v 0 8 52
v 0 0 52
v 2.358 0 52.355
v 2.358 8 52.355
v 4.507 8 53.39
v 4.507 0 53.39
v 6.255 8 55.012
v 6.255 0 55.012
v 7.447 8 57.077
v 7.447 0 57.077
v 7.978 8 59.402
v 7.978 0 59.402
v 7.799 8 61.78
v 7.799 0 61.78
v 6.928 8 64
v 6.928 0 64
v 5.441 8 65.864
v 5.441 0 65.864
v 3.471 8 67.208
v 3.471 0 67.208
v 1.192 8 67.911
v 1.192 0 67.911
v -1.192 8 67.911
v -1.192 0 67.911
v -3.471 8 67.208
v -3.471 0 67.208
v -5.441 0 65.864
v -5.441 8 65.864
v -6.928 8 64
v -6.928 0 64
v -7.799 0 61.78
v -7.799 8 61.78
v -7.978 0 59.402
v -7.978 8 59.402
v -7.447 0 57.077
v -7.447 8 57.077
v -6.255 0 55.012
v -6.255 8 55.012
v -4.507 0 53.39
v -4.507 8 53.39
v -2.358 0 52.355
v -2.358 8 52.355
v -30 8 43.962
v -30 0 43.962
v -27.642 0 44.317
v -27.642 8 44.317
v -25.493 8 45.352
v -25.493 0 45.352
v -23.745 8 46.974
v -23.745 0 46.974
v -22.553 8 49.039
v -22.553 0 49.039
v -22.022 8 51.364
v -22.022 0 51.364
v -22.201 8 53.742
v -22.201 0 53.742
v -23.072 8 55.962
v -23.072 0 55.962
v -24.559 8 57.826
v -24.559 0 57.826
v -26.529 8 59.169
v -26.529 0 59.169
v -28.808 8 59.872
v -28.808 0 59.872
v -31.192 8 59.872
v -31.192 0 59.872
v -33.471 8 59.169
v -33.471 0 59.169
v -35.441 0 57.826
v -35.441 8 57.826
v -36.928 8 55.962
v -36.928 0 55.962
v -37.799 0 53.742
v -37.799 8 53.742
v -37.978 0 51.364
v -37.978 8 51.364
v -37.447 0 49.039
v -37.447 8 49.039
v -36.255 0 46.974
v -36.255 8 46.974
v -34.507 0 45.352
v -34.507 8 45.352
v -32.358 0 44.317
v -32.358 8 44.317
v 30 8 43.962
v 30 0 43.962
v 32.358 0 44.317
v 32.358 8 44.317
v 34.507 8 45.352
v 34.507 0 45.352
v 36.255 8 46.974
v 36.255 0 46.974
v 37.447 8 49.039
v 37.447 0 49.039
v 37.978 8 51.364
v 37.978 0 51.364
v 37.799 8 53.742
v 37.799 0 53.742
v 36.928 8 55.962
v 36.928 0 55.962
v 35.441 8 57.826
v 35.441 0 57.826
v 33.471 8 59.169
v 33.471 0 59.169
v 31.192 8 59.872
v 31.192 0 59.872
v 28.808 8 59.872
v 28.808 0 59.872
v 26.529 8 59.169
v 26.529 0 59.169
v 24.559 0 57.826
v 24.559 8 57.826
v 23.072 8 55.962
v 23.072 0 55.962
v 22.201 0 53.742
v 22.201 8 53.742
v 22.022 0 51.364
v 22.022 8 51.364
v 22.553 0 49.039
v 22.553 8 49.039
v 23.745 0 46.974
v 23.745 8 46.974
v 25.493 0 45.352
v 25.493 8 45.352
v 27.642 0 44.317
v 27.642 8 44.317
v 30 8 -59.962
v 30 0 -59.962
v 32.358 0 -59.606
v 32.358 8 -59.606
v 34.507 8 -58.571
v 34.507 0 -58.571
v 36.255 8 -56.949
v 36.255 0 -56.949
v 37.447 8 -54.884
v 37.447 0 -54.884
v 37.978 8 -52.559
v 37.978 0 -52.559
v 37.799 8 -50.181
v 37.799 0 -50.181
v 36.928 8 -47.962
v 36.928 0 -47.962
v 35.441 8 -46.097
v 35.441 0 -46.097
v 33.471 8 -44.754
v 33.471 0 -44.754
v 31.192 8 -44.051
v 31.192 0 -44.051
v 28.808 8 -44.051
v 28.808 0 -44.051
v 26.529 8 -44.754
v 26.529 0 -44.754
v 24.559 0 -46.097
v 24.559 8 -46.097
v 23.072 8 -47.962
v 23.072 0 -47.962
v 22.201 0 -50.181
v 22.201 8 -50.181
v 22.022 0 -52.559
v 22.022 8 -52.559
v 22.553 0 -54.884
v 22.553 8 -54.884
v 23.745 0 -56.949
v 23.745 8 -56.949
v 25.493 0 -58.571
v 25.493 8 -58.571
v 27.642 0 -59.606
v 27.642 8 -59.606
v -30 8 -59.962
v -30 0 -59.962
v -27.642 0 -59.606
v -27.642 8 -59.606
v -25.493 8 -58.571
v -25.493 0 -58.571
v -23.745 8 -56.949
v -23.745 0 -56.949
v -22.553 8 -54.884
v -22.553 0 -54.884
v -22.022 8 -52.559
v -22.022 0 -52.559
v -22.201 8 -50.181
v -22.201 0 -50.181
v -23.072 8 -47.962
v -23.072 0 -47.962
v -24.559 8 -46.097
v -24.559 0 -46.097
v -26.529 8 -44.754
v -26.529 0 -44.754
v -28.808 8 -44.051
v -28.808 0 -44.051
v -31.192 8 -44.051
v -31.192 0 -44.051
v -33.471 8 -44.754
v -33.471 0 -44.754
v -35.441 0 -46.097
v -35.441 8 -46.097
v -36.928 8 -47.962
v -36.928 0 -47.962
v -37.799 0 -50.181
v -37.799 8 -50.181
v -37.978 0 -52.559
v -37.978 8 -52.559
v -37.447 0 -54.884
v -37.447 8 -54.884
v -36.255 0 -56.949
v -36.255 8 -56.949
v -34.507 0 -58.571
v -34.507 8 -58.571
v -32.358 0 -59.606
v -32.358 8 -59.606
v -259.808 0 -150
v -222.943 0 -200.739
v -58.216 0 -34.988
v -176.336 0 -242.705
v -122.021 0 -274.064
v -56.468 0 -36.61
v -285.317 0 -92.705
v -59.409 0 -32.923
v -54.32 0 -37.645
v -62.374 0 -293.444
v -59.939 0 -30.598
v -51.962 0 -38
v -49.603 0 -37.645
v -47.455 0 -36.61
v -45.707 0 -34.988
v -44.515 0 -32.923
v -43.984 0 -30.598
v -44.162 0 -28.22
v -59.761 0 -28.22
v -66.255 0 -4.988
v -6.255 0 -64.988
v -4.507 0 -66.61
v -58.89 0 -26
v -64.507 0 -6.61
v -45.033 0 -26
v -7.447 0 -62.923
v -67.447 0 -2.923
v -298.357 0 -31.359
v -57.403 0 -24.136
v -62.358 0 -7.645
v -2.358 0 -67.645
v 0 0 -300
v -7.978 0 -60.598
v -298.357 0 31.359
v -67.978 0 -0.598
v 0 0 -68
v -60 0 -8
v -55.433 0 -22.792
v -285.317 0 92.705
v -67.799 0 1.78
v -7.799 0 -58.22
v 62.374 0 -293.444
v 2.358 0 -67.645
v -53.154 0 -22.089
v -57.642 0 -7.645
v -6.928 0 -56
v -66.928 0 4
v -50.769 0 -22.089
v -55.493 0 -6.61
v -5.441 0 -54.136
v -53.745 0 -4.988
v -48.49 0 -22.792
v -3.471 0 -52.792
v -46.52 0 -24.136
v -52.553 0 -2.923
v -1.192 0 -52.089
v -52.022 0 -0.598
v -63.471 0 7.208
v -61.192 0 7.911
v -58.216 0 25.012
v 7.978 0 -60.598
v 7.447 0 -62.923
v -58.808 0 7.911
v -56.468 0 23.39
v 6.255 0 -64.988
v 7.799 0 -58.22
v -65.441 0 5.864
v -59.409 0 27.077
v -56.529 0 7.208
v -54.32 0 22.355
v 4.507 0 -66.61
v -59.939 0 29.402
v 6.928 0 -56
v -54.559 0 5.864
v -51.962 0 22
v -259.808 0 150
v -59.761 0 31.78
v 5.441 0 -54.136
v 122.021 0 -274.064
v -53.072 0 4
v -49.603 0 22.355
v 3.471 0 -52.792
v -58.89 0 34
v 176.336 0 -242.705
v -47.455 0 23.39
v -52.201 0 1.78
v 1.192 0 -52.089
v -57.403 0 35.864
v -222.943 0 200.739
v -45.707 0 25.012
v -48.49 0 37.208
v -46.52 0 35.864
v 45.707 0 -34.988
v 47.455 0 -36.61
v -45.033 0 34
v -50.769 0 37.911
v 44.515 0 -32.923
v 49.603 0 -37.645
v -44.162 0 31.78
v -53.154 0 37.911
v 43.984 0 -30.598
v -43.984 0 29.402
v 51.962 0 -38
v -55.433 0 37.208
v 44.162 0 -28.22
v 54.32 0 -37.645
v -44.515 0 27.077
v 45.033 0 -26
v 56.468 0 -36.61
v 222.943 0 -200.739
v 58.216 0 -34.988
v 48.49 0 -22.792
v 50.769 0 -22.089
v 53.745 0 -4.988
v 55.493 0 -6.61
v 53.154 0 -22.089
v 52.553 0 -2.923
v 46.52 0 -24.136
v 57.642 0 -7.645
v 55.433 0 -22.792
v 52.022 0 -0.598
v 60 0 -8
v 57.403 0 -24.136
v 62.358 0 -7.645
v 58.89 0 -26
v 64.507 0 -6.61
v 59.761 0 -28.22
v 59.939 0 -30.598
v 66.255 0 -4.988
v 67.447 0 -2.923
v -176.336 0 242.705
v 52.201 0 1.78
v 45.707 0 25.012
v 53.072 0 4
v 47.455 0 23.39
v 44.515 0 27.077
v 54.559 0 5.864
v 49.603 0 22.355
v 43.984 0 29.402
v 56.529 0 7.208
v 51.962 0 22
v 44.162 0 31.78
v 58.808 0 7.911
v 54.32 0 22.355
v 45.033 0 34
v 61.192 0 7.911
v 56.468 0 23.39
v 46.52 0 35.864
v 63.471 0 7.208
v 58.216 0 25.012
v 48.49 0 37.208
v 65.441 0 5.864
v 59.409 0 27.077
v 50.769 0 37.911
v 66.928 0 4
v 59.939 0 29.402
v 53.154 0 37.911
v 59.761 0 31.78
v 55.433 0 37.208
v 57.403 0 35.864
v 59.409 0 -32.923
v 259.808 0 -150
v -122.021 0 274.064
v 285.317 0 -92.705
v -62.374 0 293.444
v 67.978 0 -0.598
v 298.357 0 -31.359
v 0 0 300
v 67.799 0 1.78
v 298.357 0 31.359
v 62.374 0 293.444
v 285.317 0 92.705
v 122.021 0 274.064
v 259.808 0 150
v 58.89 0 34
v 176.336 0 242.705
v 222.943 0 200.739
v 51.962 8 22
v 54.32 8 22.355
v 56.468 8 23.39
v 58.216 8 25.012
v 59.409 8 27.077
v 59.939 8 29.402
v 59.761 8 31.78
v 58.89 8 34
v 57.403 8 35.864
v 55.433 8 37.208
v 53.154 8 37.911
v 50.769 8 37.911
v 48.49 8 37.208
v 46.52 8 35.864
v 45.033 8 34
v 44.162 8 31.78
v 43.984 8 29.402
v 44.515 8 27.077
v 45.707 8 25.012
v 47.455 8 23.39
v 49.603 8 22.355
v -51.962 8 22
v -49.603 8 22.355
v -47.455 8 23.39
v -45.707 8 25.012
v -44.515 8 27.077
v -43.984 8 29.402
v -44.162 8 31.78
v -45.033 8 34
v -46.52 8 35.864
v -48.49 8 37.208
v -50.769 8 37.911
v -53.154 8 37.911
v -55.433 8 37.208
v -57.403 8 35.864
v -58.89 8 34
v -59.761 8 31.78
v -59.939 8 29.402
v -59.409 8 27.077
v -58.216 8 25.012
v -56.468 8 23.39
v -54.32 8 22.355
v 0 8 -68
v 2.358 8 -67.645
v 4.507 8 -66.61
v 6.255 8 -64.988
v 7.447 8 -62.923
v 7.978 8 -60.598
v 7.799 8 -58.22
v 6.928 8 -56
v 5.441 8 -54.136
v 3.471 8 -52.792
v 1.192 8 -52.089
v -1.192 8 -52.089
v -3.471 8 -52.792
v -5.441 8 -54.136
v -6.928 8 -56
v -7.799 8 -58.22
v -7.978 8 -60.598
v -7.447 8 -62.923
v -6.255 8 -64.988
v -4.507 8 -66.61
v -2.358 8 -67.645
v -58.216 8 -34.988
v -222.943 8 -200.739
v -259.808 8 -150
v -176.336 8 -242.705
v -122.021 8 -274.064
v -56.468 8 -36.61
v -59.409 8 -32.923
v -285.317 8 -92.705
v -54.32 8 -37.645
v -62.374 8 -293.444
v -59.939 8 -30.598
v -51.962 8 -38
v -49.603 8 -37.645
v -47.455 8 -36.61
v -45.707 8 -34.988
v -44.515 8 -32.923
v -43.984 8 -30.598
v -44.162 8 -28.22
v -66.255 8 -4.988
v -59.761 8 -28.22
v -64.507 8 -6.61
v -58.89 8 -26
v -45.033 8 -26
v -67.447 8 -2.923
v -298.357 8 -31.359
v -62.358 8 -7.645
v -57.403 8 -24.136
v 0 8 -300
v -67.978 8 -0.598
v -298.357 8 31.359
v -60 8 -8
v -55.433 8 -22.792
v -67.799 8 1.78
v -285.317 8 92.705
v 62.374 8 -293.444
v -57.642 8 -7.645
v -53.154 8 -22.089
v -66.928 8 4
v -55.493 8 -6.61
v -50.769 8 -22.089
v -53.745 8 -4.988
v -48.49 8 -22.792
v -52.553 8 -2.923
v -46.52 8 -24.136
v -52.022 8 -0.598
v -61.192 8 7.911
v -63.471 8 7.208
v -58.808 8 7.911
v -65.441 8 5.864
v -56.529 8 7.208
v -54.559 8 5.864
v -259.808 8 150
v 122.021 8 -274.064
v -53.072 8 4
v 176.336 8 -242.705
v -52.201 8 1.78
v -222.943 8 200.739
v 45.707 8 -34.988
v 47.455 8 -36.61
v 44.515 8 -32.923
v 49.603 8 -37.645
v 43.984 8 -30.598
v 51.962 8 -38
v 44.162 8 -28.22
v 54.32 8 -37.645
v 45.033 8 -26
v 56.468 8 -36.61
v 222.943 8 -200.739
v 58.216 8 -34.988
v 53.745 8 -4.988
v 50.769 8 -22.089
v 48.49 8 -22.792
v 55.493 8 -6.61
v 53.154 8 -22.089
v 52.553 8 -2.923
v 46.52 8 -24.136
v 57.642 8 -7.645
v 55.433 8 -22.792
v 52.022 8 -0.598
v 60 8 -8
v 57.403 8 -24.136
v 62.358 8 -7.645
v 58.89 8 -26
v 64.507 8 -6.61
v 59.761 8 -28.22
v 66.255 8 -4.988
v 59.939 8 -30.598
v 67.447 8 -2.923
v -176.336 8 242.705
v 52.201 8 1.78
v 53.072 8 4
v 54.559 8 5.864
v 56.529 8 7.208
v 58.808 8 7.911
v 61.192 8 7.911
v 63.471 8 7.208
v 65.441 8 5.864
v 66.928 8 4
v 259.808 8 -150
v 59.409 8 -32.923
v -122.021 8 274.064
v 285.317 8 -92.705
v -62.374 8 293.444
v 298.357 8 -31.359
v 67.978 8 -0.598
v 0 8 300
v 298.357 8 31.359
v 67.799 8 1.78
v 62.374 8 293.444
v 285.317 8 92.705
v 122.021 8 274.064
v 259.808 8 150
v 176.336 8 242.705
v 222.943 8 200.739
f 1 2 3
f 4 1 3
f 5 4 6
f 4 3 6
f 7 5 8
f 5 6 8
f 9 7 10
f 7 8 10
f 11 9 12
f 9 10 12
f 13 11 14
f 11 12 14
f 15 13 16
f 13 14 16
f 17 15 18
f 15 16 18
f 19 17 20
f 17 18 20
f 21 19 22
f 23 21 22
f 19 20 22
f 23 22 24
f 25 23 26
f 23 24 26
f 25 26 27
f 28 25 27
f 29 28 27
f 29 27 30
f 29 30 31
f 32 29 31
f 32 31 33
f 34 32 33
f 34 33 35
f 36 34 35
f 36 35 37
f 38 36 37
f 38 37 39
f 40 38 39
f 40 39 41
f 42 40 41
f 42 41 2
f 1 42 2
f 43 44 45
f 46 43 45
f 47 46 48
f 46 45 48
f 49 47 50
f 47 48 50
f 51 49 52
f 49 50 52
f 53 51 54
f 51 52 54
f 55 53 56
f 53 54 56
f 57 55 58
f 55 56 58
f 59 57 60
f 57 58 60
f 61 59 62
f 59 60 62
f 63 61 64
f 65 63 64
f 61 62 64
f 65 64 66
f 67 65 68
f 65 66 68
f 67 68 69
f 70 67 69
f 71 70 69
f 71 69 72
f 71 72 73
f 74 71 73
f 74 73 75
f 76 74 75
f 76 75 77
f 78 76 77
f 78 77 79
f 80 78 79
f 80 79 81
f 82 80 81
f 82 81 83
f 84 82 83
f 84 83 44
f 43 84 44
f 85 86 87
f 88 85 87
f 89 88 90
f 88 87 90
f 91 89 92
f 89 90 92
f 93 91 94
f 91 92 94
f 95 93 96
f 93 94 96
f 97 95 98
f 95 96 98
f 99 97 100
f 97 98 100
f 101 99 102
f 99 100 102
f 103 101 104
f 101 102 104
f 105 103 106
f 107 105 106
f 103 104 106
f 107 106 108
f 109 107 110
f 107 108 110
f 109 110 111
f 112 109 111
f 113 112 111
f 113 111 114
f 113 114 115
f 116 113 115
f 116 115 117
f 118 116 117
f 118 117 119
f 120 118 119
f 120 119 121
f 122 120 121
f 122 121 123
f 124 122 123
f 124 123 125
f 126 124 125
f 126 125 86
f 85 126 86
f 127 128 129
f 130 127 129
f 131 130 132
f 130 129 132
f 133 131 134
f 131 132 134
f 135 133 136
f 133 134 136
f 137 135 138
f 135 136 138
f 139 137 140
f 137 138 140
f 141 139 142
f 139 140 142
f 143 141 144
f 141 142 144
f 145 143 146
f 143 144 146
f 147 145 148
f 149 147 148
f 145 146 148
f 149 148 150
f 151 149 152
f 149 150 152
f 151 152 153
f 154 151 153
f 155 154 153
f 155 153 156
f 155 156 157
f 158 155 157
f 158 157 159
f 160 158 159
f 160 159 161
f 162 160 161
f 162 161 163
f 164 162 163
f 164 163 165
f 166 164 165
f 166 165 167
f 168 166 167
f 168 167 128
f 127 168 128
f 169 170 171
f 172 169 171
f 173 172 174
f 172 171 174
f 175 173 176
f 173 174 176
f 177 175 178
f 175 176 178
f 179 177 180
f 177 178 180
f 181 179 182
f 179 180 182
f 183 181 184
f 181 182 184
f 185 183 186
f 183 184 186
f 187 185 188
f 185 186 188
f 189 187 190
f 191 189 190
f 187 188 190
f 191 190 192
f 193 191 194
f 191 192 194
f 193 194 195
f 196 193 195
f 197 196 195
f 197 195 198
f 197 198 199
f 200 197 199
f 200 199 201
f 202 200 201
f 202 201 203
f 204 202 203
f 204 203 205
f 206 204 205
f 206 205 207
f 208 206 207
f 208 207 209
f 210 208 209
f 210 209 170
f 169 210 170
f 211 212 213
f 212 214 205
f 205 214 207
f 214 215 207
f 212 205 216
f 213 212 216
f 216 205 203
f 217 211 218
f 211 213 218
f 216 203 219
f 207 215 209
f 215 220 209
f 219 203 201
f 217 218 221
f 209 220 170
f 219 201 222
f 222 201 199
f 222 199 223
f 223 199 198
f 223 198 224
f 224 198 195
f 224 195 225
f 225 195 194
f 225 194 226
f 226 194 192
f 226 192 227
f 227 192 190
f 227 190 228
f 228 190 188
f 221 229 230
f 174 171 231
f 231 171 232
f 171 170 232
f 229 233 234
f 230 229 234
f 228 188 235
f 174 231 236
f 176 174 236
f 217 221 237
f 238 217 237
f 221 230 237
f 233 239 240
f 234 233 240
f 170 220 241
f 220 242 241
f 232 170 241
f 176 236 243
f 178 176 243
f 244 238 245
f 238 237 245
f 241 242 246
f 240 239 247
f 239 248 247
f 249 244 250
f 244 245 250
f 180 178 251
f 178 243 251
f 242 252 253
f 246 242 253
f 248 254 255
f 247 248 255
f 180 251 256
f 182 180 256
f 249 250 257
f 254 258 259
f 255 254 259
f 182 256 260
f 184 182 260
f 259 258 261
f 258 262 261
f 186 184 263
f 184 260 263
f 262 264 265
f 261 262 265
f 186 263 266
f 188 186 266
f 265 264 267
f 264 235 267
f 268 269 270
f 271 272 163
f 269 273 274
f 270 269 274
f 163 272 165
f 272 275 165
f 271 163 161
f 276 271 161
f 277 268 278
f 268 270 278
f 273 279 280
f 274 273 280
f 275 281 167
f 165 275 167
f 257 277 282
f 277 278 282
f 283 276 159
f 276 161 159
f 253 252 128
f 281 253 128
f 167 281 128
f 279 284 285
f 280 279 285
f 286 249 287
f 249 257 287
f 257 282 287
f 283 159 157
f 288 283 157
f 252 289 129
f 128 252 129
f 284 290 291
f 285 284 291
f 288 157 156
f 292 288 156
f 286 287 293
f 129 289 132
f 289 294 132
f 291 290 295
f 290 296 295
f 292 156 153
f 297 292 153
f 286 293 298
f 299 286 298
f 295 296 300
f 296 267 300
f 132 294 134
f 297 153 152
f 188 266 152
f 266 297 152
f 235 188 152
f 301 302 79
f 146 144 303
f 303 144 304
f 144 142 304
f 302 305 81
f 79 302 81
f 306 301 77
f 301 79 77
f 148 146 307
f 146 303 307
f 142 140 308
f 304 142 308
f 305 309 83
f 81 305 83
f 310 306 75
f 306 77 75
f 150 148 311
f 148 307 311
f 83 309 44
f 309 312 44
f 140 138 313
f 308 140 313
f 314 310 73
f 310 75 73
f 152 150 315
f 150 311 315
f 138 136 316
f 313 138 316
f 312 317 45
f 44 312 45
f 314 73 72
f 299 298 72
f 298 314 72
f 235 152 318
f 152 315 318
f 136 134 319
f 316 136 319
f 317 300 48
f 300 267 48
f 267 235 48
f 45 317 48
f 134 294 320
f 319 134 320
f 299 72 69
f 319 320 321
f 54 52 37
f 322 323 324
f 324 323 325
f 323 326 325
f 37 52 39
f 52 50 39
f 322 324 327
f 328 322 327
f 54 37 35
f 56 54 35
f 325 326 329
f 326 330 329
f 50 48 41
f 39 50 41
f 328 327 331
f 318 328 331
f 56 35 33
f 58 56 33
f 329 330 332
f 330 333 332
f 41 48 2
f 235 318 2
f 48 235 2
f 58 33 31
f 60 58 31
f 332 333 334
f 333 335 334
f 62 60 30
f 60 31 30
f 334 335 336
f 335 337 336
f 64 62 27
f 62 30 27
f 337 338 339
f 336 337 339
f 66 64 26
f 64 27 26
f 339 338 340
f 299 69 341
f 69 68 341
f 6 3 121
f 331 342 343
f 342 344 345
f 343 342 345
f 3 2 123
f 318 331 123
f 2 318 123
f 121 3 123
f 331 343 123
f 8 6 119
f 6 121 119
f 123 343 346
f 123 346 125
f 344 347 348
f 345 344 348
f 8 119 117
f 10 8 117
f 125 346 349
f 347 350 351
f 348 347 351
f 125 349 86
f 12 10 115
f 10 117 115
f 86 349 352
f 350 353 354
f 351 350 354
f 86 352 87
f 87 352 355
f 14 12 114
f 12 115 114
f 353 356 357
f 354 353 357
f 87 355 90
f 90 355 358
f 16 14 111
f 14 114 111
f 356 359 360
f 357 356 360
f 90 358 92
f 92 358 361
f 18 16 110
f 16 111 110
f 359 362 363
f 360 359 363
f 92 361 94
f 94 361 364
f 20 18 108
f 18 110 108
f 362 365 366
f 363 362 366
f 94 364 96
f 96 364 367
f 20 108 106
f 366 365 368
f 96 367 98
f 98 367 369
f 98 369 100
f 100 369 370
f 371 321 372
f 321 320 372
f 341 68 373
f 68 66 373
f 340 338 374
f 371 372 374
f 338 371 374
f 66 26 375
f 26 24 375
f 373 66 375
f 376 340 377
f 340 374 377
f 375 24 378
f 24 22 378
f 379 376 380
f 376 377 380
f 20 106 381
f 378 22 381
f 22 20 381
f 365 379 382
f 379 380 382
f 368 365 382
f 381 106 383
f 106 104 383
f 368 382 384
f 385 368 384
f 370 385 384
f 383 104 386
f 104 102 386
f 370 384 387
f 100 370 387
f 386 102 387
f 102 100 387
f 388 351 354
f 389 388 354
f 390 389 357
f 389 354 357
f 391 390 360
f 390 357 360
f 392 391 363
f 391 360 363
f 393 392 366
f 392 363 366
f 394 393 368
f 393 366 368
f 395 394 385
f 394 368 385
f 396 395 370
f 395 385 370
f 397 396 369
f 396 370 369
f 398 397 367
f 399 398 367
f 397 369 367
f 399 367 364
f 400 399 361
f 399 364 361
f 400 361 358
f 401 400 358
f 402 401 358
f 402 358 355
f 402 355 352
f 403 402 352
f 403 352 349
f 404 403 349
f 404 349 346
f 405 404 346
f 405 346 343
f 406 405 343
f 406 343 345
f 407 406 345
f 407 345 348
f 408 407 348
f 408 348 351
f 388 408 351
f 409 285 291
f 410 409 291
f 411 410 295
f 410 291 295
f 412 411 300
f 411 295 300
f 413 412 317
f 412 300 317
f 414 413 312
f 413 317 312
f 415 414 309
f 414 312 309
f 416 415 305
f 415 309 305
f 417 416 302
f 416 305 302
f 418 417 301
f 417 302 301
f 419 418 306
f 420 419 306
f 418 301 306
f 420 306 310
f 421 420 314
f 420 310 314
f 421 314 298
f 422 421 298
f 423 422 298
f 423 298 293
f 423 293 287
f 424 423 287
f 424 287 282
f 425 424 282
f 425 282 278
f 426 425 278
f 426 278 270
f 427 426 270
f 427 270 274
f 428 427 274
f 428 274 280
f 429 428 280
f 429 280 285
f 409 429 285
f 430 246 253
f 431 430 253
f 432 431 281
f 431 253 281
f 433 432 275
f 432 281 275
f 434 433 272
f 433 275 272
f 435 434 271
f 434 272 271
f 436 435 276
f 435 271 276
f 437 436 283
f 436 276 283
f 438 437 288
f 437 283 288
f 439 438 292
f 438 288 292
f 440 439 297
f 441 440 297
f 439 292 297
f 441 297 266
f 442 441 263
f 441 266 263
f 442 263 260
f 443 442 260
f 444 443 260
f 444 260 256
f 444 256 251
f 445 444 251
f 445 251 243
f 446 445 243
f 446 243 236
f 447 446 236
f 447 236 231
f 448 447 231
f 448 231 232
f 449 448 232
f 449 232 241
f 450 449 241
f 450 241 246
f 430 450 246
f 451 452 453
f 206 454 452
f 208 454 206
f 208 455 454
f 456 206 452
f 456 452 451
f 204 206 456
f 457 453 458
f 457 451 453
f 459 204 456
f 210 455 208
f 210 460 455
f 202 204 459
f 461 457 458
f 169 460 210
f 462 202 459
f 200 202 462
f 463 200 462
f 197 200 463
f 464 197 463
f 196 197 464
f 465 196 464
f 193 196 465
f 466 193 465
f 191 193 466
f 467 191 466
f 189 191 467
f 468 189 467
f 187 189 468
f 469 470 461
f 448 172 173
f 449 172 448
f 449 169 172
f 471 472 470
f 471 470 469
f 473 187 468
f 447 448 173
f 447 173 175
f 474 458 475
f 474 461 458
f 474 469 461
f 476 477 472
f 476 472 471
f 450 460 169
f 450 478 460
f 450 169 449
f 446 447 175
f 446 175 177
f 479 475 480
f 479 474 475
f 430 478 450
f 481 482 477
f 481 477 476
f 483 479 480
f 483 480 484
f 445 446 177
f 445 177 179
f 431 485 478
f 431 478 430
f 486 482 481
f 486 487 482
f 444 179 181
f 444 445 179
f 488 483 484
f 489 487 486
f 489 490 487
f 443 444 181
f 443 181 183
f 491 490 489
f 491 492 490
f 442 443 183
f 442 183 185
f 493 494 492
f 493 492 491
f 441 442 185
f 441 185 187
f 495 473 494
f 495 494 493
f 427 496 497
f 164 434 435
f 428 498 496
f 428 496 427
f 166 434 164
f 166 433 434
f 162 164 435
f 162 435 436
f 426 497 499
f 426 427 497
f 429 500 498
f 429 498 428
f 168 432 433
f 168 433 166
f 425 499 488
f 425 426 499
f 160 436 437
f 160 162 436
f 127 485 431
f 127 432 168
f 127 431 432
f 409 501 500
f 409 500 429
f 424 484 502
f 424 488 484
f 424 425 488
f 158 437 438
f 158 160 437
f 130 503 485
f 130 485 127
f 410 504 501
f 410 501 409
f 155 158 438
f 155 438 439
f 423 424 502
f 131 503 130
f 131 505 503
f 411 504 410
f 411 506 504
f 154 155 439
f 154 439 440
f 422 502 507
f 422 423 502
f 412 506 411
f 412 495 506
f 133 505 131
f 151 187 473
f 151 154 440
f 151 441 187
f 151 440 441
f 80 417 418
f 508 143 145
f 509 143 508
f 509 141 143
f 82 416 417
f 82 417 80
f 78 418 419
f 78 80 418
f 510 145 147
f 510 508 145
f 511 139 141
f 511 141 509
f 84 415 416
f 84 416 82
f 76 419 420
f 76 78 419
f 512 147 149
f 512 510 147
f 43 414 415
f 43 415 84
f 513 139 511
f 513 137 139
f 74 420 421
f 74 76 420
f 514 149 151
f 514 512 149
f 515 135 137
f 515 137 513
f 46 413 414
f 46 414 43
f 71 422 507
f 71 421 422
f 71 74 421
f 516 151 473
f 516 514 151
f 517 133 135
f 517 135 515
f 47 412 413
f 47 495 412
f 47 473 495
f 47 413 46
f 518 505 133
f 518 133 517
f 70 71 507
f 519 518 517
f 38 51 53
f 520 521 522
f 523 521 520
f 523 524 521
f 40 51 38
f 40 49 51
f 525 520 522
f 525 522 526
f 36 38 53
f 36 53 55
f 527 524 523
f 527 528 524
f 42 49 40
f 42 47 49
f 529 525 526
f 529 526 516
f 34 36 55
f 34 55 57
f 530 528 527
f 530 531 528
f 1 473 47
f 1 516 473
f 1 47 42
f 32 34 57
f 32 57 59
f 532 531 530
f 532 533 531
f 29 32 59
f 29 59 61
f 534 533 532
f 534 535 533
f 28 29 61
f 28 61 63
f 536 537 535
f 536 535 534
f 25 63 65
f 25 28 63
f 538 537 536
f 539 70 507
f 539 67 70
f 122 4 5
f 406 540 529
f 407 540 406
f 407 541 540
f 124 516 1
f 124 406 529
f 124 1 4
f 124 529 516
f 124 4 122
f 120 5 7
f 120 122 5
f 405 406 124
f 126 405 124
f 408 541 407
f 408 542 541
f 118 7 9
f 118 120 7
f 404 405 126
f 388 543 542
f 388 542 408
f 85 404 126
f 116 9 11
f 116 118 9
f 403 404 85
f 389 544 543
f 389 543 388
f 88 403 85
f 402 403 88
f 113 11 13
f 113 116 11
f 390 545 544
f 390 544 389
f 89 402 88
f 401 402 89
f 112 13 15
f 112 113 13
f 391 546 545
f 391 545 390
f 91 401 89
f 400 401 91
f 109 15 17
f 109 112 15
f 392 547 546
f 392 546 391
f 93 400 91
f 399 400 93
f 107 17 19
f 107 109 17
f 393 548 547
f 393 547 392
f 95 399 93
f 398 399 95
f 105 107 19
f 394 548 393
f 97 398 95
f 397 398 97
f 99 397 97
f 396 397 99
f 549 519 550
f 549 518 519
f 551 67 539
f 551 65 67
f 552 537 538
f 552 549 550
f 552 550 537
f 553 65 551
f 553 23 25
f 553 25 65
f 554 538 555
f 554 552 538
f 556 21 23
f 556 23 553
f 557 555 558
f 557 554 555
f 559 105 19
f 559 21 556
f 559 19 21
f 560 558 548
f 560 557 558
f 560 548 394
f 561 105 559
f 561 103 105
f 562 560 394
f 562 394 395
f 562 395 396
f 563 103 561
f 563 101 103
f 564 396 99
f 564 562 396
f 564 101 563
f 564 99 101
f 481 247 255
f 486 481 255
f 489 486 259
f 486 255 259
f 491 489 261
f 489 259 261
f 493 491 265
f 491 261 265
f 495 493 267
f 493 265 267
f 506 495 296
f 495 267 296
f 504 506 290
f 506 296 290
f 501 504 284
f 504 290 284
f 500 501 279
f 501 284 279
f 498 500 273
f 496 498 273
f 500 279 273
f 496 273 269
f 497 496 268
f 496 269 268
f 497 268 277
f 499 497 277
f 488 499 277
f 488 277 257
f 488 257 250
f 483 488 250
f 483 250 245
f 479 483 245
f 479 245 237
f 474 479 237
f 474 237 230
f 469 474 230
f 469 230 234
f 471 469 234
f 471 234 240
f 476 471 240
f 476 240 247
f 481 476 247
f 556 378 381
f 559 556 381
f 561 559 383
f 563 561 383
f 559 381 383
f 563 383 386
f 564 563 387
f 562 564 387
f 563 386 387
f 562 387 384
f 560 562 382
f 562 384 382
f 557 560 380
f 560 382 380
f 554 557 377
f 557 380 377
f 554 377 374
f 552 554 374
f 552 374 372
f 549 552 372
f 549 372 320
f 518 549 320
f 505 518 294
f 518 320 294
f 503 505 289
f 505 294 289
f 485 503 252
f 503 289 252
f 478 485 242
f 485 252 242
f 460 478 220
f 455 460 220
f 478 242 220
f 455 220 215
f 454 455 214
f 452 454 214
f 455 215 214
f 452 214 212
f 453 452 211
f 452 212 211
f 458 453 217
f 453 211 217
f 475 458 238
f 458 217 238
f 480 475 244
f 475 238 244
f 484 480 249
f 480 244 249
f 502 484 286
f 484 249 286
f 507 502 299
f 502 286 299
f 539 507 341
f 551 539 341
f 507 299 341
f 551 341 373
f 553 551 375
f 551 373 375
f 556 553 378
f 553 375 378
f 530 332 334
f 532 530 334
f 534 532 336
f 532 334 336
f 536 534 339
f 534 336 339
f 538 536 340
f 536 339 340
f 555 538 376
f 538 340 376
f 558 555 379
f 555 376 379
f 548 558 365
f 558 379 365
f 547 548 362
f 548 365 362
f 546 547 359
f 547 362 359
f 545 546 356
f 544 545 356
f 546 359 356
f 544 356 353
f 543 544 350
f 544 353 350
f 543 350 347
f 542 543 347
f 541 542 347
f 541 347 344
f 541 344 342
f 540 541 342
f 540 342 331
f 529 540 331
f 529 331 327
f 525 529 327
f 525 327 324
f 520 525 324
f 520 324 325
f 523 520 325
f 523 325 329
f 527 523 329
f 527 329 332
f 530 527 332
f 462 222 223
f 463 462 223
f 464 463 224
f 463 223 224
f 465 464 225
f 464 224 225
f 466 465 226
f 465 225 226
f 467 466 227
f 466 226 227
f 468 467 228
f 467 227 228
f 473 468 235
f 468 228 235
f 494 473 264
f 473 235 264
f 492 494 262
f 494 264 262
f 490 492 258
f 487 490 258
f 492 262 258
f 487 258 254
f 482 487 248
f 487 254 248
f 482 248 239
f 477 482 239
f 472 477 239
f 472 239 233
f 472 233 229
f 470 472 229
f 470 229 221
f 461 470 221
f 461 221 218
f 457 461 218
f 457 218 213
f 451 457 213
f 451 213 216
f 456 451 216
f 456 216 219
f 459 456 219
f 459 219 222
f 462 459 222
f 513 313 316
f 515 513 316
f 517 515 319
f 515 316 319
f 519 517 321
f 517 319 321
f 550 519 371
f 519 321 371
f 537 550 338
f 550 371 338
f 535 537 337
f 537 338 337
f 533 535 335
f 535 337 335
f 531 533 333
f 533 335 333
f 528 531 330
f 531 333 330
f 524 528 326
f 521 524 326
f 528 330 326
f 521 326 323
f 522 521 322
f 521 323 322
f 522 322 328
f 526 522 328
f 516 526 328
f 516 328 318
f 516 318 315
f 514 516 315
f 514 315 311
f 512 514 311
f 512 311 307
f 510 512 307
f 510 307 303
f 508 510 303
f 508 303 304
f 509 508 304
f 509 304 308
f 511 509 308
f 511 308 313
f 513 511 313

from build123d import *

# Parameters (mm, degrees)
SKETCH1_R           = 300
BOSS_EXTRUDE1_DEPTH = 8
SKETCH2_R           = 8
CUT_EXTRUDE1_DEPTH  = 425.339486732


with BuildPart() as part:
    # Sketch1 → Boss-Extrude1 (new body)
    with BuildSketch(Plane(origin=(0, 0, 0), x_dir=(1, 0, 0), z_dir=(0, 1, 0))):
        with Locations(Location((0, 0, 0), (0, 0, 270))):
            Circle(SKETCH1_R)
    extrude(amount=BOSS_EXTRUDE1_DEPTH)

    # Sketch2 → Cut-Extrude1 (cut, through all)
    with BuildSketch(Plane.XZ):
        with Locations(Location((0, 60, 0), (0, 0, 270))):
            Circle(SKETCH2_R)
        with Locations(Location((30, 51.961524227, 0), (0, 0, 270))):
            Circle(SKETCH2_R)
        with Locations(Location((51.961524227, 30, 0), (0, 0, 270))):
            Circle(SKETCH2_R)
        with Locations(Location((60, 0, 0), (0, 0, 270))):
            Circle(SKETCH2_R)
        with Locations(Location((51.961524227, -30, 0), (0, 0, 270))):
            Circle(SKETCH2_R)
        with Locations(Location((30, -51.961524227, 0), (0, 0, 270))):
            Circle(SKETCH2_R)
        with Locations(Location((0, -60, 0), (0, 0, 270))):
            Circle(SKETCH2_R)
        with Locations(Location((-30, -51.961524227, 0), (0, 0, 270))):
            Circle(SKETCH2_R)
        with Locations(Location((-51.961524227, -30, 0), (0, 0, 270))):
            Circle(SKETCH2_R)
        with Locations(Location((-60, 0, 0), (0, 0, 270))):
            Circle(SKETCH2_R)
        with Locations(Location((-51.961524227, 30, 0), (0, 0, 270))):
            Circle(SKETCH2_R)
        with Locations(Location((-30, 51.961524227, 0), (0, 0, 270))):
            Circle(SKETCH2_R)
    extrude(amount=-CUT_EXTRUDE1_DEPTH, mode=Mode.SUBTRACT)


solid = part.part
